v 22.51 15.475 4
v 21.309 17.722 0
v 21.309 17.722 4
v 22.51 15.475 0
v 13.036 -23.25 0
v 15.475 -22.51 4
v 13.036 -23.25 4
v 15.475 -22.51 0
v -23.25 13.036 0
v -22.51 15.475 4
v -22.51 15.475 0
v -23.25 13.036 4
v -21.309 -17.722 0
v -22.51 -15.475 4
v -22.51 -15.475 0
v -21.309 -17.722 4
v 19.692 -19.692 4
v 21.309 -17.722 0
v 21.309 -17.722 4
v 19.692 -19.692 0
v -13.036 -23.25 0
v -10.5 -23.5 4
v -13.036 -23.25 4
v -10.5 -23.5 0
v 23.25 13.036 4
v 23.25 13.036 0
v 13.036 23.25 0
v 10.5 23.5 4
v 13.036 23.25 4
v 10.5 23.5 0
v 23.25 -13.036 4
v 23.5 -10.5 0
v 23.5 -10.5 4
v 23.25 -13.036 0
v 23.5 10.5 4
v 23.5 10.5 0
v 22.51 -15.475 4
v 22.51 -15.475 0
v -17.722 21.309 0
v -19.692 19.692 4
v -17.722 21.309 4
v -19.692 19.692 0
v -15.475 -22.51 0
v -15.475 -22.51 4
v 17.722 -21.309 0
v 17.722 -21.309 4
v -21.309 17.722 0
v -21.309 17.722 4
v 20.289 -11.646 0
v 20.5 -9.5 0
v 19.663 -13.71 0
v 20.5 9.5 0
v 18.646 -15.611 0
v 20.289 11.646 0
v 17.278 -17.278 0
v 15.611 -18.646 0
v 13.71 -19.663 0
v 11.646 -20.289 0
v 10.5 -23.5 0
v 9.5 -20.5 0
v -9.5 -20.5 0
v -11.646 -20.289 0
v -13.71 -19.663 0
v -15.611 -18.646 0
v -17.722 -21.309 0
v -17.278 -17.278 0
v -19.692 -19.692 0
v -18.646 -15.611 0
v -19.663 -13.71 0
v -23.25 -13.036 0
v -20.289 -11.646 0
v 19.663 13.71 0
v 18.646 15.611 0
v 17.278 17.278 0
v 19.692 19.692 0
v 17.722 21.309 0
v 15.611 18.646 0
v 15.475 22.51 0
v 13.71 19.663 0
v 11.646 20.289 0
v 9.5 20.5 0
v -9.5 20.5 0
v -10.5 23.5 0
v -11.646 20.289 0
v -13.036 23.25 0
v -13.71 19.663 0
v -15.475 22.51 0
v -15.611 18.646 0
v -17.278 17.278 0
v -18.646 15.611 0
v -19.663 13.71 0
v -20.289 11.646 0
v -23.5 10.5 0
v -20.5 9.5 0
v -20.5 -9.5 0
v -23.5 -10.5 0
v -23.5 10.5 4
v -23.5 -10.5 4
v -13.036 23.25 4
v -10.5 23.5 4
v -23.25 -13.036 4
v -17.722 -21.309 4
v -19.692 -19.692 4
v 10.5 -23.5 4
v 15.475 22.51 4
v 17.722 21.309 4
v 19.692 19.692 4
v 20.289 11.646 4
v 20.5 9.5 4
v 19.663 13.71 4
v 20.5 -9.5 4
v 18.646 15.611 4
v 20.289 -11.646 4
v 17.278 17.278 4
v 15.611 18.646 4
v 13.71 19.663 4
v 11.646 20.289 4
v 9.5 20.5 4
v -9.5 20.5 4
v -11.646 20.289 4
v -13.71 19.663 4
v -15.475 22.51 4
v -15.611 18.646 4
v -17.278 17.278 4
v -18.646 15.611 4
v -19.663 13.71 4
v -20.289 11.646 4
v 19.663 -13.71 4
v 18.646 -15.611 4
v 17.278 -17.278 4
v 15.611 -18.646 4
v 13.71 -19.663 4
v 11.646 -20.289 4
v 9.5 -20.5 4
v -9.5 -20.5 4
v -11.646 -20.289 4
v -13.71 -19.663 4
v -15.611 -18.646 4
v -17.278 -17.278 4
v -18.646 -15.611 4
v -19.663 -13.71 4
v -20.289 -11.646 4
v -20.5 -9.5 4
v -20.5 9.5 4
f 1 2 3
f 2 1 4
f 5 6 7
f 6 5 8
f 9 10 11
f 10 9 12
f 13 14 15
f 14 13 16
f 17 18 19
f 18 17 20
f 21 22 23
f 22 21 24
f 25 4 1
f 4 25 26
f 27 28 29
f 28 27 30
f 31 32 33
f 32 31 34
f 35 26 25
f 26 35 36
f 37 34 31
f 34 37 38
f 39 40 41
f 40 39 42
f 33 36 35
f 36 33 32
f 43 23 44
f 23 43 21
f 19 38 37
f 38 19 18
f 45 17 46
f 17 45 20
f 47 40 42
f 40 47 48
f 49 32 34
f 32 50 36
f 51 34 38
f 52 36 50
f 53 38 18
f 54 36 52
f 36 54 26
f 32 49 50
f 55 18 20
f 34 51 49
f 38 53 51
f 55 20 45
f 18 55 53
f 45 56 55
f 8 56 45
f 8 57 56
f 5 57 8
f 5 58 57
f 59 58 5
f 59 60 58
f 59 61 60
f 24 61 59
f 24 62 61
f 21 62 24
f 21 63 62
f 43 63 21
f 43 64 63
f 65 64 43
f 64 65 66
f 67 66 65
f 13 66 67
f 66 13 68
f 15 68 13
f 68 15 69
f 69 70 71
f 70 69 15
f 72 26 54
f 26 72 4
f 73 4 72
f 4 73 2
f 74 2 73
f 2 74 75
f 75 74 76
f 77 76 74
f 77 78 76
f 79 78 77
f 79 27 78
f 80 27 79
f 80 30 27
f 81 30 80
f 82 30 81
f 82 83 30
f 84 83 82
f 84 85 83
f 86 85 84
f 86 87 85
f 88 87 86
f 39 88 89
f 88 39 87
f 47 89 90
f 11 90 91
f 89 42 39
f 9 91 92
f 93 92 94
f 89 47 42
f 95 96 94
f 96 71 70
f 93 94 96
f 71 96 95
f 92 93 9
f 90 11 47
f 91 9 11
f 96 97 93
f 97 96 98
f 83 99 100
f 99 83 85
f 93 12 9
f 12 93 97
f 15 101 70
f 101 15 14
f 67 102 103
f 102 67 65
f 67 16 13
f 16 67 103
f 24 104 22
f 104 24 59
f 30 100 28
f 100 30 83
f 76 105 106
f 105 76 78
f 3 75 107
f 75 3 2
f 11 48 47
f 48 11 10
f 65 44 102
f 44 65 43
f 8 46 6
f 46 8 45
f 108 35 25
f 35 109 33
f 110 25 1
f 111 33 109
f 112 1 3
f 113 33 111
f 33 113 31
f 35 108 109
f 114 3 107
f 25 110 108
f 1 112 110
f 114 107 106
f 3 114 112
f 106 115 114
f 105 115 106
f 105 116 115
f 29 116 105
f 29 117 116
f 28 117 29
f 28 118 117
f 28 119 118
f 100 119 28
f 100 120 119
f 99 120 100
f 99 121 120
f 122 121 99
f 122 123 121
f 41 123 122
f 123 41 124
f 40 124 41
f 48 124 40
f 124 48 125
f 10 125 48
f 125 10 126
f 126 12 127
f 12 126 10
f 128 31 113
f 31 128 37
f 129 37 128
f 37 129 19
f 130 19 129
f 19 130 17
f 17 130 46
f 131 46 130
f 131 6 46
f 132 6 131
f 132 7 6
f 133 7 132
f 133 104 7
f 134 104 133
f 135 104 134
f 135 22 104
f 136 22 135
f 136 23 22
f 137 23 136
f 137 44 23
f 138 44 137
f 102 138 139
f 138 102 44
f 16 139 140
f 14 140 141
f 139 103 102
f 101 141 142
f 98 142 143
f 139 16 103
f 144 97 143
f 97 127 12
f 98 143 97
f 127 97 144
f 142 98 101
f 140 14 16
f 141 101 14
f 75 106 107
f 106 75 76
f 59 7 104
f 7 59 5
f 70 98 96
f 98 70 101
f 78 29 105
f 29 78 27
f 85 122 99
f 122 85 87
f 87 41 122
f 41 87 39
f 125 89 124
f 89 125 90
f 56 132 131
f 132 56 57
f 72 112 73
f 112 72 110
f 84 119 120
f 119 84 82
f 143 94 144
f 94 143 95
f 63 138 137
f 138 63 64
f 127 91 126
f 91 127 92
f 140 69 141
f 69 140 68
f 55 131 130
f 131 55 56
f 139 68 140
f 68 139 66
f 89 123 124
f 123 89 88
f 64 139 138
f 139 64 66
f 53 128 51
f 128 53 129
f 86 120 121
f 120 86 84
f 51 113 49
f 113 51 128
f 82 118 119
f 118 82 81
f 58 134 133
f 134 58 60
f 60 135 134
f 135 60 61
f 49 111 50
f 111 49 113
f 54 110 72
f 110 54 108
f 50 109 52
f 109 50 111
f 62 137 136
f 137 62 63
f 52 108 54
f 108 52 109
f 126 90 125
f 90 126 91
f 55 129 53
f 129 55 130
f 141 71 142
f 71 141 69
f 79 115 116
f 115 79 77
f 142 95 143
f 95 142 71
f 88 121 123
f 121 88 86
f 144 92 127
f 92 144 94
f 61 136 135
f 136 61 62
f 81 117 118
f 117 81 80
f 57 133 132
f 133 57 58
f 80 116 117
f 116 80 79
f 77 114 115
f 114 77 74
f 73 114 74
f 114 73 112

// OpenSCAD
// file: ../globals.scad
$fn = 64;

// The tolerance of your 3d printer that results in a "tight fit" of two parts.
tolerance = 0.1;

// A small value to be used to offset unions and differences to avoid "z-fighting"
epsilon = 0.001;
// file: ../shapes.scad
// The xy_ variants of shape modules are centered with respect to the X/Y axes and "sit" on te XY plane.

$fn=32;

module xy_cube(width, depth, height) {
    translate([0, 0, height / 2])
    cube([width, depth, height], center=true);
}

module xy_cylinder(
    h,
    r, r1, r2,
    d, d1, d2)
{
    translate([0, 0, h / 2])
    cylinder(h=h, r=r, r1=r1, r2=r2, d=d, d1=d1, d2=d2, center=true);
}

module rounded_square(width, length, radius) {
    diameter = radius * 2;
    
    minkowski() {
        square([width - diameter, length - diameter], center=true);
        circle(radius);
    }
}

// Spreads out its children, spacing them along the x/y/z axis by the given amount.
module spread(x, y, z) {
    for(i = [0 : $children -1 ]) {
        translate([i*x, i*y, i*z])
        children(i);
    }
}

spread(15, 0, 0) {
    xy_cube(10, 10, 10);
    xy_cylinder(10, d=10);
    rounded_square(5, 10, 1);
}
// main file
use <../shapes.scad>

include <../globals.scad>


thickness = 4.0;

difference() {
    linear_extrude(thickness)
    rounded_square(47.0, 47.0, 13.0);
    
    translate([0, 0, -epsilon]* 2)
    linear_extrude(thickness + epsilon*4)
    rounded_square(41.0, 41.0, 11);
}
